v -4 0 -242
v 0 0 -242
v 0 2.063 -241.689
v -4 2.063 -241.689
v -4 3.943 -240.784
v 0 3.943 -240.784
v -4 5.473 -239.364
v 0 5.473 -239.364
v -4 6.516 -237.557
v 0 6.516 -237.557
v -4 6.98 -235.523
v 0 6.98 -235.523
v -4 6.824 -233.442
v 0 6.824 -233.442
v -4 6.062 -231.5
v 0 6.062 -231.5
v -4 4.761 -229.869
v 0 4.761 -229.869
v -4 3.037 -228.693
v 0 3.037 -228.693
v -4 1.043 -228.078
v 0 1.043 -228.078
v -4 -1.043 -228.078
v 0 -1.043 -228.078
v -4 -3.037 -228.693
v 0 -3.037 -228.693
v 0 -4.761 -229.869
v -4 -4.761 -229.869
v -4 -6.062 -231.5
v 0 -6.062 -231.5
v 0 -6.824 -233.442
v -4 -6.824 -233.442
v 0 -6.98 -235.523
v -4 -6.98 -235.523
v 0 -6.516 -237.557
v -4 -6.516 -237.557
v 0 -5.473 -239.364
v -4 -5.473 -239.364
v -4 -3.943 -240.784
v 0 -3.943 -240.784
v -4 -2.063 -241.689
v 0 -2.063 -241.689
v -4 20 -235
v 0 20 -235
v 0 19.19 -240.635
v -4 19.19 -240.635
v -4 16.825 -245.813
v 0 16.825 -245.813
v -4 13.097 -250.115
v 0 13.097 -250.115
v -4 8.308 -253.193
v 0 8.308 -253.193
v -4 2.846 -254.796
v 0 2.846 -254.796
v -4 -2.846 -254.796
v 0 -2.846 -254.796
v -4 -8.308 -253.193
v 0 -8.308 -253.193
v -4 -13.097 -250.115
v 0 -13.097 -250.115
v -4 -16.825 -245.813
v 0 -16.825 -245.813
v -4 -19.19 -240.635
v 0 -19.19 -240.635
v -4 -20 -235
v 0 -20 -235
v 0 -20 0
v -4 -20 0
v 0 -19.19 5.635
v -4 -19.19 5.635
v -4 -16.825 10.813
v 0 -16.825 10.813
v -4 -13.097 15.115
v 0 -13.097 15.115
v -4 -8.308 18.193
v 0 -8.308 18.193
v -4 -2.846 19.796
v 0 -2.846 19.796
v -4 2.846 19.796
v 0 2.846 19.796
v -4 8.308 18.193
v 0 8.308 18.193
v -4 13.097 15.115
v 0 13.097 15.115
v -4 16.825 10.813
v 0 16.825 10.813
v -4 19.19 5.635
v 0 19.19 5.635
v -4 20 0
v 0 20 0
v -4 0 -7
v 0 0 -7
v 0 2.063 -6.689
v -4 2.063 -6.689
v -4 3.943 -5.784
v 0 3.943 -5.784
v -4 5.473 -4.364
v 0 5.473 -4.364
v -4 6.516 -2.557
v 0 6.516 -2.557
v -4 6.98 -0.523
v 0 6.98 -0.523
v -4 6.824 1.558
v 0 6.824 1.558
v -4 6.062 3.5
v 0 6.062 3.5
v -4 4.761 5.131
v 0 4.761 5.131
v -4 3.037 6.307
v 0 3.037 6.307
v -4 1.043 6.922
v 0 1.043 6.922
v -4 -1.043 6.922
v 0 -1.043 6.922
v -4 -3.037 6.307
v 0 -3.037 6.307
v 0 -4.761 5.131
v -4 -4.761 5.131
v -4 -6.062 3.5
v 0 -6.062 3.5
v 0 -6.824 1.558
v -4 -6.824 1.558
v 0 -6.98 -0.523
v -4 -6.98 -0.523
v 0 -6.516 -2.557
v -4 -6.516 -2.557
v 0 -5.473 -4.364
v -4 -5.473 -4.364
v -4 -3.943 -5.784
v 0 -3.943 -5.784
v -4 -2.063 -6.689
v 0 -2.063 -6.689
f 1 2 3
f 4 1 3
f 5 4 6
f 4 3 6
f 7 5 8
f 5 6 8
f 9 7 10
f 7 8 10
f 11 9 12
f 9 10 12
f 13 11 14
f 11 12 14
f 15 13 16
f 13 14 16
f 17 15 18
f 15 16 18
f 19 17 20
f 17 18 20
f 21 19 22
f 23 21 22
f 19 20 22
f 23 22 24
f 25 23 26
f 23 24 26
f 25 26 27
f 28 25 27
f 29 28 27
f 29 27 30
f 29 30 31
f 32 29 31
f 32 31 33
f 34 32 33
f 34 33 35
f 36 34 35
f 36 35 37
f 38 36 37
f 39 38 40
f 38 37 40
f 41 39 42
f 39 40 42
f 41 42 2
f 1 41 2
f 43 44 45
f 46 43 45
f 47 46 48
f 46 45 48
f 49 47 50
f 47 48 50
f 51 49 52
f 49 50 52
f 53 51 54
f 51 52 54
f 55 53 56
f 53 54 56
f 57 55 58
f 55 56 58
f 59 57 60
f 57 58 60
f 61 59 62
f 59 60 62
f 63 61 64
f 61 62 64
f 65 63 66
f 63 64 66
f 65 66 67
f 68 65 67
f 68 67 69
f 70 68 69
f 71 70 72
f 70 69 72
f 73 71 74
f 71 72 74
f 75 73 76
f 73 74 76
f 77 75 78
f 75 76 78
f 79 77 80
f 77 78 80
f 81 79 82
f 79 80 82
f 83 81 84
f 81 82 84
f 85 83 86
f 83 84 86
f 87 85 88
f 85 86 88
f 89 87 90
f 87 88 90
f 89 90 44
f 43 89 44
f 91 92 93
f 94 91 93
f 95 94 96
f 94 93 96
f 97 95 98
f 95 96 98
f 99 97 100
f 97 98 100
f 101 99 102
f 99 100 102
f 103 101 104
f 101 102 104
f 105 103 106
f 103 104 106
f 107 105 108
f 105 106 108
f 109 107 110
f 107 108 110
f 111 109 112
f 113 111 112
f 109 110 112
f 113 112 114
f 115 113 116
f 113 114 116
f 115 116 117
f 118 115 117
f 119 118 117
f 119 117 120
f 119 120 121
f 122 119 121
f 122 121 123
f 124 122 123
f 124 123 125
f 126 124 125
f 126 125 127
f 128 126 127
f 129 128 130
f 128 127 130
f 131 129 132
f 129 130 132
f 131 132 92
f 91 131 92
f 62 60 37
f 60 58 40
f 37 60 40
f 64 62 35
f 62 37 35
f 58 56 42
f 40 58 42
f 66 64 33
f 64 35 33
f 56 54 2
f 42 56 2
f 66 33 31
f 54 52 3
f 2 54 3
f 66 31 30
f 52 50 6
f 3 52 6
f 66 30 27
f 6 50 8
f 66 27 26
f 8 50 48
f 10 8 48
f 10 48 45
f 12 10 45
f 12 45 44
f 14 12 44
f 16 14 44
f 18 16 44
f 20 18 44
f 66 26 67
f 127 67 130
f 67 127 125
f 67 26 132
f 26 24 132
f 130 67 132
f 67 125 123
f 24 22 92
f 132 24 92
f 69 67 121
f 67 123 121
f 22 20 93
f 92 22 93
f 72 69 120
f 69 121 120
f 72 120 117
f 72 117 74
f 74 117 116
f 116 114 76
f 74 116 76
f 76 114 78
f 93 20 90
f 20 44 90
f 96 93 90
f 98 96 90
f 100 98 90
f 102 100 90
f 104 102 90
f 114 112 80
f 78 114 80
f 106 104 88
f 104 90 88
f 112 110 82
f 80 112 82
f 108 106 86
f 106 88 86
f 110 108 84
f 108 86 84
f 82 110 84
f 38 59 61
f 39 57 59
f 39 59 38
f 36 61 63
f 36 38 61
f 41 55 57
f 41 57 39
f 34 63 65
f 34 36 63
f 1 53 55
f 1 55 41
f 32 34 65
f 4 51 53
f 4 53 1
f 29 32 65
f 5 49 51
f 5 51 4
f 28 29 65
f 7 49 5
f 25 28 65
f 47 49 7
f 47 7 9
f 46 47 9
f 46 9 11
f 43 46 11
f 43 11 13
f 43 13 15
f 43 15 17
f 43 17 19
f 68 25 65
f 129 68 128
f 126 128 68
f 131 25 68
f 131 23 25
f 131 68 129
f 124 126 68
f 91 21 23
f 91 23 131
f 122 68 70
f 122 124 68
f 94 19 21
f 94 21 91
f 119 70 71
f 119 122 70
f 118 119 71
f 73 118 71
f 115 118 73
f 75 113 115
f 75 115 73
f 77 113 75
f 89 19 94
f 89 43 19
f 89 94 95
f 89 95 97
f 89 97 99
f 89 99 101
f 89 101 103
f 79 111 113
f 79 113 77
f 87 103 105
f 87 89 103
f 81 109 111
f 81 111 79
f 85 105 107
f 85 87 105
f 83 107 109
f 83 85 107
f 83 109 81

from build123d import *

# Parameters (mm, degrees)
SKETCH_1_R             = 7
SM_BASE_FLANGE_1_DEPTH = 4


# Sheet-metal steps are written as plain solids
with BuildPart() as part:
    # Sketch 1 → Базовая кромка1 (new body)
    with BuildSketch(Plane(origin=(0, 0, 0), x_dir=(0, 0, -1), z_dir=(1, 0, 0))):
        with BuildLine():
            Line((0, 20), (235, 20))
            ThreePointArc((235, 20), (255, 0), (235, -20))
            Line((235, -20), (0, -20))
            ThreePointArc((0, -20), (-20, 0), (0, 20))
        make_face()
        Circle(SKETCH_1_R, mode=Mode.SUBTRACT)
        with Locations((235, 0)):
            Circle(SKETCH_1_R, mode=Mode.SUBTRACT)
    extrude(amount=-SM_BASE_FLANGE_1_DEPTH)


solid = part.part
